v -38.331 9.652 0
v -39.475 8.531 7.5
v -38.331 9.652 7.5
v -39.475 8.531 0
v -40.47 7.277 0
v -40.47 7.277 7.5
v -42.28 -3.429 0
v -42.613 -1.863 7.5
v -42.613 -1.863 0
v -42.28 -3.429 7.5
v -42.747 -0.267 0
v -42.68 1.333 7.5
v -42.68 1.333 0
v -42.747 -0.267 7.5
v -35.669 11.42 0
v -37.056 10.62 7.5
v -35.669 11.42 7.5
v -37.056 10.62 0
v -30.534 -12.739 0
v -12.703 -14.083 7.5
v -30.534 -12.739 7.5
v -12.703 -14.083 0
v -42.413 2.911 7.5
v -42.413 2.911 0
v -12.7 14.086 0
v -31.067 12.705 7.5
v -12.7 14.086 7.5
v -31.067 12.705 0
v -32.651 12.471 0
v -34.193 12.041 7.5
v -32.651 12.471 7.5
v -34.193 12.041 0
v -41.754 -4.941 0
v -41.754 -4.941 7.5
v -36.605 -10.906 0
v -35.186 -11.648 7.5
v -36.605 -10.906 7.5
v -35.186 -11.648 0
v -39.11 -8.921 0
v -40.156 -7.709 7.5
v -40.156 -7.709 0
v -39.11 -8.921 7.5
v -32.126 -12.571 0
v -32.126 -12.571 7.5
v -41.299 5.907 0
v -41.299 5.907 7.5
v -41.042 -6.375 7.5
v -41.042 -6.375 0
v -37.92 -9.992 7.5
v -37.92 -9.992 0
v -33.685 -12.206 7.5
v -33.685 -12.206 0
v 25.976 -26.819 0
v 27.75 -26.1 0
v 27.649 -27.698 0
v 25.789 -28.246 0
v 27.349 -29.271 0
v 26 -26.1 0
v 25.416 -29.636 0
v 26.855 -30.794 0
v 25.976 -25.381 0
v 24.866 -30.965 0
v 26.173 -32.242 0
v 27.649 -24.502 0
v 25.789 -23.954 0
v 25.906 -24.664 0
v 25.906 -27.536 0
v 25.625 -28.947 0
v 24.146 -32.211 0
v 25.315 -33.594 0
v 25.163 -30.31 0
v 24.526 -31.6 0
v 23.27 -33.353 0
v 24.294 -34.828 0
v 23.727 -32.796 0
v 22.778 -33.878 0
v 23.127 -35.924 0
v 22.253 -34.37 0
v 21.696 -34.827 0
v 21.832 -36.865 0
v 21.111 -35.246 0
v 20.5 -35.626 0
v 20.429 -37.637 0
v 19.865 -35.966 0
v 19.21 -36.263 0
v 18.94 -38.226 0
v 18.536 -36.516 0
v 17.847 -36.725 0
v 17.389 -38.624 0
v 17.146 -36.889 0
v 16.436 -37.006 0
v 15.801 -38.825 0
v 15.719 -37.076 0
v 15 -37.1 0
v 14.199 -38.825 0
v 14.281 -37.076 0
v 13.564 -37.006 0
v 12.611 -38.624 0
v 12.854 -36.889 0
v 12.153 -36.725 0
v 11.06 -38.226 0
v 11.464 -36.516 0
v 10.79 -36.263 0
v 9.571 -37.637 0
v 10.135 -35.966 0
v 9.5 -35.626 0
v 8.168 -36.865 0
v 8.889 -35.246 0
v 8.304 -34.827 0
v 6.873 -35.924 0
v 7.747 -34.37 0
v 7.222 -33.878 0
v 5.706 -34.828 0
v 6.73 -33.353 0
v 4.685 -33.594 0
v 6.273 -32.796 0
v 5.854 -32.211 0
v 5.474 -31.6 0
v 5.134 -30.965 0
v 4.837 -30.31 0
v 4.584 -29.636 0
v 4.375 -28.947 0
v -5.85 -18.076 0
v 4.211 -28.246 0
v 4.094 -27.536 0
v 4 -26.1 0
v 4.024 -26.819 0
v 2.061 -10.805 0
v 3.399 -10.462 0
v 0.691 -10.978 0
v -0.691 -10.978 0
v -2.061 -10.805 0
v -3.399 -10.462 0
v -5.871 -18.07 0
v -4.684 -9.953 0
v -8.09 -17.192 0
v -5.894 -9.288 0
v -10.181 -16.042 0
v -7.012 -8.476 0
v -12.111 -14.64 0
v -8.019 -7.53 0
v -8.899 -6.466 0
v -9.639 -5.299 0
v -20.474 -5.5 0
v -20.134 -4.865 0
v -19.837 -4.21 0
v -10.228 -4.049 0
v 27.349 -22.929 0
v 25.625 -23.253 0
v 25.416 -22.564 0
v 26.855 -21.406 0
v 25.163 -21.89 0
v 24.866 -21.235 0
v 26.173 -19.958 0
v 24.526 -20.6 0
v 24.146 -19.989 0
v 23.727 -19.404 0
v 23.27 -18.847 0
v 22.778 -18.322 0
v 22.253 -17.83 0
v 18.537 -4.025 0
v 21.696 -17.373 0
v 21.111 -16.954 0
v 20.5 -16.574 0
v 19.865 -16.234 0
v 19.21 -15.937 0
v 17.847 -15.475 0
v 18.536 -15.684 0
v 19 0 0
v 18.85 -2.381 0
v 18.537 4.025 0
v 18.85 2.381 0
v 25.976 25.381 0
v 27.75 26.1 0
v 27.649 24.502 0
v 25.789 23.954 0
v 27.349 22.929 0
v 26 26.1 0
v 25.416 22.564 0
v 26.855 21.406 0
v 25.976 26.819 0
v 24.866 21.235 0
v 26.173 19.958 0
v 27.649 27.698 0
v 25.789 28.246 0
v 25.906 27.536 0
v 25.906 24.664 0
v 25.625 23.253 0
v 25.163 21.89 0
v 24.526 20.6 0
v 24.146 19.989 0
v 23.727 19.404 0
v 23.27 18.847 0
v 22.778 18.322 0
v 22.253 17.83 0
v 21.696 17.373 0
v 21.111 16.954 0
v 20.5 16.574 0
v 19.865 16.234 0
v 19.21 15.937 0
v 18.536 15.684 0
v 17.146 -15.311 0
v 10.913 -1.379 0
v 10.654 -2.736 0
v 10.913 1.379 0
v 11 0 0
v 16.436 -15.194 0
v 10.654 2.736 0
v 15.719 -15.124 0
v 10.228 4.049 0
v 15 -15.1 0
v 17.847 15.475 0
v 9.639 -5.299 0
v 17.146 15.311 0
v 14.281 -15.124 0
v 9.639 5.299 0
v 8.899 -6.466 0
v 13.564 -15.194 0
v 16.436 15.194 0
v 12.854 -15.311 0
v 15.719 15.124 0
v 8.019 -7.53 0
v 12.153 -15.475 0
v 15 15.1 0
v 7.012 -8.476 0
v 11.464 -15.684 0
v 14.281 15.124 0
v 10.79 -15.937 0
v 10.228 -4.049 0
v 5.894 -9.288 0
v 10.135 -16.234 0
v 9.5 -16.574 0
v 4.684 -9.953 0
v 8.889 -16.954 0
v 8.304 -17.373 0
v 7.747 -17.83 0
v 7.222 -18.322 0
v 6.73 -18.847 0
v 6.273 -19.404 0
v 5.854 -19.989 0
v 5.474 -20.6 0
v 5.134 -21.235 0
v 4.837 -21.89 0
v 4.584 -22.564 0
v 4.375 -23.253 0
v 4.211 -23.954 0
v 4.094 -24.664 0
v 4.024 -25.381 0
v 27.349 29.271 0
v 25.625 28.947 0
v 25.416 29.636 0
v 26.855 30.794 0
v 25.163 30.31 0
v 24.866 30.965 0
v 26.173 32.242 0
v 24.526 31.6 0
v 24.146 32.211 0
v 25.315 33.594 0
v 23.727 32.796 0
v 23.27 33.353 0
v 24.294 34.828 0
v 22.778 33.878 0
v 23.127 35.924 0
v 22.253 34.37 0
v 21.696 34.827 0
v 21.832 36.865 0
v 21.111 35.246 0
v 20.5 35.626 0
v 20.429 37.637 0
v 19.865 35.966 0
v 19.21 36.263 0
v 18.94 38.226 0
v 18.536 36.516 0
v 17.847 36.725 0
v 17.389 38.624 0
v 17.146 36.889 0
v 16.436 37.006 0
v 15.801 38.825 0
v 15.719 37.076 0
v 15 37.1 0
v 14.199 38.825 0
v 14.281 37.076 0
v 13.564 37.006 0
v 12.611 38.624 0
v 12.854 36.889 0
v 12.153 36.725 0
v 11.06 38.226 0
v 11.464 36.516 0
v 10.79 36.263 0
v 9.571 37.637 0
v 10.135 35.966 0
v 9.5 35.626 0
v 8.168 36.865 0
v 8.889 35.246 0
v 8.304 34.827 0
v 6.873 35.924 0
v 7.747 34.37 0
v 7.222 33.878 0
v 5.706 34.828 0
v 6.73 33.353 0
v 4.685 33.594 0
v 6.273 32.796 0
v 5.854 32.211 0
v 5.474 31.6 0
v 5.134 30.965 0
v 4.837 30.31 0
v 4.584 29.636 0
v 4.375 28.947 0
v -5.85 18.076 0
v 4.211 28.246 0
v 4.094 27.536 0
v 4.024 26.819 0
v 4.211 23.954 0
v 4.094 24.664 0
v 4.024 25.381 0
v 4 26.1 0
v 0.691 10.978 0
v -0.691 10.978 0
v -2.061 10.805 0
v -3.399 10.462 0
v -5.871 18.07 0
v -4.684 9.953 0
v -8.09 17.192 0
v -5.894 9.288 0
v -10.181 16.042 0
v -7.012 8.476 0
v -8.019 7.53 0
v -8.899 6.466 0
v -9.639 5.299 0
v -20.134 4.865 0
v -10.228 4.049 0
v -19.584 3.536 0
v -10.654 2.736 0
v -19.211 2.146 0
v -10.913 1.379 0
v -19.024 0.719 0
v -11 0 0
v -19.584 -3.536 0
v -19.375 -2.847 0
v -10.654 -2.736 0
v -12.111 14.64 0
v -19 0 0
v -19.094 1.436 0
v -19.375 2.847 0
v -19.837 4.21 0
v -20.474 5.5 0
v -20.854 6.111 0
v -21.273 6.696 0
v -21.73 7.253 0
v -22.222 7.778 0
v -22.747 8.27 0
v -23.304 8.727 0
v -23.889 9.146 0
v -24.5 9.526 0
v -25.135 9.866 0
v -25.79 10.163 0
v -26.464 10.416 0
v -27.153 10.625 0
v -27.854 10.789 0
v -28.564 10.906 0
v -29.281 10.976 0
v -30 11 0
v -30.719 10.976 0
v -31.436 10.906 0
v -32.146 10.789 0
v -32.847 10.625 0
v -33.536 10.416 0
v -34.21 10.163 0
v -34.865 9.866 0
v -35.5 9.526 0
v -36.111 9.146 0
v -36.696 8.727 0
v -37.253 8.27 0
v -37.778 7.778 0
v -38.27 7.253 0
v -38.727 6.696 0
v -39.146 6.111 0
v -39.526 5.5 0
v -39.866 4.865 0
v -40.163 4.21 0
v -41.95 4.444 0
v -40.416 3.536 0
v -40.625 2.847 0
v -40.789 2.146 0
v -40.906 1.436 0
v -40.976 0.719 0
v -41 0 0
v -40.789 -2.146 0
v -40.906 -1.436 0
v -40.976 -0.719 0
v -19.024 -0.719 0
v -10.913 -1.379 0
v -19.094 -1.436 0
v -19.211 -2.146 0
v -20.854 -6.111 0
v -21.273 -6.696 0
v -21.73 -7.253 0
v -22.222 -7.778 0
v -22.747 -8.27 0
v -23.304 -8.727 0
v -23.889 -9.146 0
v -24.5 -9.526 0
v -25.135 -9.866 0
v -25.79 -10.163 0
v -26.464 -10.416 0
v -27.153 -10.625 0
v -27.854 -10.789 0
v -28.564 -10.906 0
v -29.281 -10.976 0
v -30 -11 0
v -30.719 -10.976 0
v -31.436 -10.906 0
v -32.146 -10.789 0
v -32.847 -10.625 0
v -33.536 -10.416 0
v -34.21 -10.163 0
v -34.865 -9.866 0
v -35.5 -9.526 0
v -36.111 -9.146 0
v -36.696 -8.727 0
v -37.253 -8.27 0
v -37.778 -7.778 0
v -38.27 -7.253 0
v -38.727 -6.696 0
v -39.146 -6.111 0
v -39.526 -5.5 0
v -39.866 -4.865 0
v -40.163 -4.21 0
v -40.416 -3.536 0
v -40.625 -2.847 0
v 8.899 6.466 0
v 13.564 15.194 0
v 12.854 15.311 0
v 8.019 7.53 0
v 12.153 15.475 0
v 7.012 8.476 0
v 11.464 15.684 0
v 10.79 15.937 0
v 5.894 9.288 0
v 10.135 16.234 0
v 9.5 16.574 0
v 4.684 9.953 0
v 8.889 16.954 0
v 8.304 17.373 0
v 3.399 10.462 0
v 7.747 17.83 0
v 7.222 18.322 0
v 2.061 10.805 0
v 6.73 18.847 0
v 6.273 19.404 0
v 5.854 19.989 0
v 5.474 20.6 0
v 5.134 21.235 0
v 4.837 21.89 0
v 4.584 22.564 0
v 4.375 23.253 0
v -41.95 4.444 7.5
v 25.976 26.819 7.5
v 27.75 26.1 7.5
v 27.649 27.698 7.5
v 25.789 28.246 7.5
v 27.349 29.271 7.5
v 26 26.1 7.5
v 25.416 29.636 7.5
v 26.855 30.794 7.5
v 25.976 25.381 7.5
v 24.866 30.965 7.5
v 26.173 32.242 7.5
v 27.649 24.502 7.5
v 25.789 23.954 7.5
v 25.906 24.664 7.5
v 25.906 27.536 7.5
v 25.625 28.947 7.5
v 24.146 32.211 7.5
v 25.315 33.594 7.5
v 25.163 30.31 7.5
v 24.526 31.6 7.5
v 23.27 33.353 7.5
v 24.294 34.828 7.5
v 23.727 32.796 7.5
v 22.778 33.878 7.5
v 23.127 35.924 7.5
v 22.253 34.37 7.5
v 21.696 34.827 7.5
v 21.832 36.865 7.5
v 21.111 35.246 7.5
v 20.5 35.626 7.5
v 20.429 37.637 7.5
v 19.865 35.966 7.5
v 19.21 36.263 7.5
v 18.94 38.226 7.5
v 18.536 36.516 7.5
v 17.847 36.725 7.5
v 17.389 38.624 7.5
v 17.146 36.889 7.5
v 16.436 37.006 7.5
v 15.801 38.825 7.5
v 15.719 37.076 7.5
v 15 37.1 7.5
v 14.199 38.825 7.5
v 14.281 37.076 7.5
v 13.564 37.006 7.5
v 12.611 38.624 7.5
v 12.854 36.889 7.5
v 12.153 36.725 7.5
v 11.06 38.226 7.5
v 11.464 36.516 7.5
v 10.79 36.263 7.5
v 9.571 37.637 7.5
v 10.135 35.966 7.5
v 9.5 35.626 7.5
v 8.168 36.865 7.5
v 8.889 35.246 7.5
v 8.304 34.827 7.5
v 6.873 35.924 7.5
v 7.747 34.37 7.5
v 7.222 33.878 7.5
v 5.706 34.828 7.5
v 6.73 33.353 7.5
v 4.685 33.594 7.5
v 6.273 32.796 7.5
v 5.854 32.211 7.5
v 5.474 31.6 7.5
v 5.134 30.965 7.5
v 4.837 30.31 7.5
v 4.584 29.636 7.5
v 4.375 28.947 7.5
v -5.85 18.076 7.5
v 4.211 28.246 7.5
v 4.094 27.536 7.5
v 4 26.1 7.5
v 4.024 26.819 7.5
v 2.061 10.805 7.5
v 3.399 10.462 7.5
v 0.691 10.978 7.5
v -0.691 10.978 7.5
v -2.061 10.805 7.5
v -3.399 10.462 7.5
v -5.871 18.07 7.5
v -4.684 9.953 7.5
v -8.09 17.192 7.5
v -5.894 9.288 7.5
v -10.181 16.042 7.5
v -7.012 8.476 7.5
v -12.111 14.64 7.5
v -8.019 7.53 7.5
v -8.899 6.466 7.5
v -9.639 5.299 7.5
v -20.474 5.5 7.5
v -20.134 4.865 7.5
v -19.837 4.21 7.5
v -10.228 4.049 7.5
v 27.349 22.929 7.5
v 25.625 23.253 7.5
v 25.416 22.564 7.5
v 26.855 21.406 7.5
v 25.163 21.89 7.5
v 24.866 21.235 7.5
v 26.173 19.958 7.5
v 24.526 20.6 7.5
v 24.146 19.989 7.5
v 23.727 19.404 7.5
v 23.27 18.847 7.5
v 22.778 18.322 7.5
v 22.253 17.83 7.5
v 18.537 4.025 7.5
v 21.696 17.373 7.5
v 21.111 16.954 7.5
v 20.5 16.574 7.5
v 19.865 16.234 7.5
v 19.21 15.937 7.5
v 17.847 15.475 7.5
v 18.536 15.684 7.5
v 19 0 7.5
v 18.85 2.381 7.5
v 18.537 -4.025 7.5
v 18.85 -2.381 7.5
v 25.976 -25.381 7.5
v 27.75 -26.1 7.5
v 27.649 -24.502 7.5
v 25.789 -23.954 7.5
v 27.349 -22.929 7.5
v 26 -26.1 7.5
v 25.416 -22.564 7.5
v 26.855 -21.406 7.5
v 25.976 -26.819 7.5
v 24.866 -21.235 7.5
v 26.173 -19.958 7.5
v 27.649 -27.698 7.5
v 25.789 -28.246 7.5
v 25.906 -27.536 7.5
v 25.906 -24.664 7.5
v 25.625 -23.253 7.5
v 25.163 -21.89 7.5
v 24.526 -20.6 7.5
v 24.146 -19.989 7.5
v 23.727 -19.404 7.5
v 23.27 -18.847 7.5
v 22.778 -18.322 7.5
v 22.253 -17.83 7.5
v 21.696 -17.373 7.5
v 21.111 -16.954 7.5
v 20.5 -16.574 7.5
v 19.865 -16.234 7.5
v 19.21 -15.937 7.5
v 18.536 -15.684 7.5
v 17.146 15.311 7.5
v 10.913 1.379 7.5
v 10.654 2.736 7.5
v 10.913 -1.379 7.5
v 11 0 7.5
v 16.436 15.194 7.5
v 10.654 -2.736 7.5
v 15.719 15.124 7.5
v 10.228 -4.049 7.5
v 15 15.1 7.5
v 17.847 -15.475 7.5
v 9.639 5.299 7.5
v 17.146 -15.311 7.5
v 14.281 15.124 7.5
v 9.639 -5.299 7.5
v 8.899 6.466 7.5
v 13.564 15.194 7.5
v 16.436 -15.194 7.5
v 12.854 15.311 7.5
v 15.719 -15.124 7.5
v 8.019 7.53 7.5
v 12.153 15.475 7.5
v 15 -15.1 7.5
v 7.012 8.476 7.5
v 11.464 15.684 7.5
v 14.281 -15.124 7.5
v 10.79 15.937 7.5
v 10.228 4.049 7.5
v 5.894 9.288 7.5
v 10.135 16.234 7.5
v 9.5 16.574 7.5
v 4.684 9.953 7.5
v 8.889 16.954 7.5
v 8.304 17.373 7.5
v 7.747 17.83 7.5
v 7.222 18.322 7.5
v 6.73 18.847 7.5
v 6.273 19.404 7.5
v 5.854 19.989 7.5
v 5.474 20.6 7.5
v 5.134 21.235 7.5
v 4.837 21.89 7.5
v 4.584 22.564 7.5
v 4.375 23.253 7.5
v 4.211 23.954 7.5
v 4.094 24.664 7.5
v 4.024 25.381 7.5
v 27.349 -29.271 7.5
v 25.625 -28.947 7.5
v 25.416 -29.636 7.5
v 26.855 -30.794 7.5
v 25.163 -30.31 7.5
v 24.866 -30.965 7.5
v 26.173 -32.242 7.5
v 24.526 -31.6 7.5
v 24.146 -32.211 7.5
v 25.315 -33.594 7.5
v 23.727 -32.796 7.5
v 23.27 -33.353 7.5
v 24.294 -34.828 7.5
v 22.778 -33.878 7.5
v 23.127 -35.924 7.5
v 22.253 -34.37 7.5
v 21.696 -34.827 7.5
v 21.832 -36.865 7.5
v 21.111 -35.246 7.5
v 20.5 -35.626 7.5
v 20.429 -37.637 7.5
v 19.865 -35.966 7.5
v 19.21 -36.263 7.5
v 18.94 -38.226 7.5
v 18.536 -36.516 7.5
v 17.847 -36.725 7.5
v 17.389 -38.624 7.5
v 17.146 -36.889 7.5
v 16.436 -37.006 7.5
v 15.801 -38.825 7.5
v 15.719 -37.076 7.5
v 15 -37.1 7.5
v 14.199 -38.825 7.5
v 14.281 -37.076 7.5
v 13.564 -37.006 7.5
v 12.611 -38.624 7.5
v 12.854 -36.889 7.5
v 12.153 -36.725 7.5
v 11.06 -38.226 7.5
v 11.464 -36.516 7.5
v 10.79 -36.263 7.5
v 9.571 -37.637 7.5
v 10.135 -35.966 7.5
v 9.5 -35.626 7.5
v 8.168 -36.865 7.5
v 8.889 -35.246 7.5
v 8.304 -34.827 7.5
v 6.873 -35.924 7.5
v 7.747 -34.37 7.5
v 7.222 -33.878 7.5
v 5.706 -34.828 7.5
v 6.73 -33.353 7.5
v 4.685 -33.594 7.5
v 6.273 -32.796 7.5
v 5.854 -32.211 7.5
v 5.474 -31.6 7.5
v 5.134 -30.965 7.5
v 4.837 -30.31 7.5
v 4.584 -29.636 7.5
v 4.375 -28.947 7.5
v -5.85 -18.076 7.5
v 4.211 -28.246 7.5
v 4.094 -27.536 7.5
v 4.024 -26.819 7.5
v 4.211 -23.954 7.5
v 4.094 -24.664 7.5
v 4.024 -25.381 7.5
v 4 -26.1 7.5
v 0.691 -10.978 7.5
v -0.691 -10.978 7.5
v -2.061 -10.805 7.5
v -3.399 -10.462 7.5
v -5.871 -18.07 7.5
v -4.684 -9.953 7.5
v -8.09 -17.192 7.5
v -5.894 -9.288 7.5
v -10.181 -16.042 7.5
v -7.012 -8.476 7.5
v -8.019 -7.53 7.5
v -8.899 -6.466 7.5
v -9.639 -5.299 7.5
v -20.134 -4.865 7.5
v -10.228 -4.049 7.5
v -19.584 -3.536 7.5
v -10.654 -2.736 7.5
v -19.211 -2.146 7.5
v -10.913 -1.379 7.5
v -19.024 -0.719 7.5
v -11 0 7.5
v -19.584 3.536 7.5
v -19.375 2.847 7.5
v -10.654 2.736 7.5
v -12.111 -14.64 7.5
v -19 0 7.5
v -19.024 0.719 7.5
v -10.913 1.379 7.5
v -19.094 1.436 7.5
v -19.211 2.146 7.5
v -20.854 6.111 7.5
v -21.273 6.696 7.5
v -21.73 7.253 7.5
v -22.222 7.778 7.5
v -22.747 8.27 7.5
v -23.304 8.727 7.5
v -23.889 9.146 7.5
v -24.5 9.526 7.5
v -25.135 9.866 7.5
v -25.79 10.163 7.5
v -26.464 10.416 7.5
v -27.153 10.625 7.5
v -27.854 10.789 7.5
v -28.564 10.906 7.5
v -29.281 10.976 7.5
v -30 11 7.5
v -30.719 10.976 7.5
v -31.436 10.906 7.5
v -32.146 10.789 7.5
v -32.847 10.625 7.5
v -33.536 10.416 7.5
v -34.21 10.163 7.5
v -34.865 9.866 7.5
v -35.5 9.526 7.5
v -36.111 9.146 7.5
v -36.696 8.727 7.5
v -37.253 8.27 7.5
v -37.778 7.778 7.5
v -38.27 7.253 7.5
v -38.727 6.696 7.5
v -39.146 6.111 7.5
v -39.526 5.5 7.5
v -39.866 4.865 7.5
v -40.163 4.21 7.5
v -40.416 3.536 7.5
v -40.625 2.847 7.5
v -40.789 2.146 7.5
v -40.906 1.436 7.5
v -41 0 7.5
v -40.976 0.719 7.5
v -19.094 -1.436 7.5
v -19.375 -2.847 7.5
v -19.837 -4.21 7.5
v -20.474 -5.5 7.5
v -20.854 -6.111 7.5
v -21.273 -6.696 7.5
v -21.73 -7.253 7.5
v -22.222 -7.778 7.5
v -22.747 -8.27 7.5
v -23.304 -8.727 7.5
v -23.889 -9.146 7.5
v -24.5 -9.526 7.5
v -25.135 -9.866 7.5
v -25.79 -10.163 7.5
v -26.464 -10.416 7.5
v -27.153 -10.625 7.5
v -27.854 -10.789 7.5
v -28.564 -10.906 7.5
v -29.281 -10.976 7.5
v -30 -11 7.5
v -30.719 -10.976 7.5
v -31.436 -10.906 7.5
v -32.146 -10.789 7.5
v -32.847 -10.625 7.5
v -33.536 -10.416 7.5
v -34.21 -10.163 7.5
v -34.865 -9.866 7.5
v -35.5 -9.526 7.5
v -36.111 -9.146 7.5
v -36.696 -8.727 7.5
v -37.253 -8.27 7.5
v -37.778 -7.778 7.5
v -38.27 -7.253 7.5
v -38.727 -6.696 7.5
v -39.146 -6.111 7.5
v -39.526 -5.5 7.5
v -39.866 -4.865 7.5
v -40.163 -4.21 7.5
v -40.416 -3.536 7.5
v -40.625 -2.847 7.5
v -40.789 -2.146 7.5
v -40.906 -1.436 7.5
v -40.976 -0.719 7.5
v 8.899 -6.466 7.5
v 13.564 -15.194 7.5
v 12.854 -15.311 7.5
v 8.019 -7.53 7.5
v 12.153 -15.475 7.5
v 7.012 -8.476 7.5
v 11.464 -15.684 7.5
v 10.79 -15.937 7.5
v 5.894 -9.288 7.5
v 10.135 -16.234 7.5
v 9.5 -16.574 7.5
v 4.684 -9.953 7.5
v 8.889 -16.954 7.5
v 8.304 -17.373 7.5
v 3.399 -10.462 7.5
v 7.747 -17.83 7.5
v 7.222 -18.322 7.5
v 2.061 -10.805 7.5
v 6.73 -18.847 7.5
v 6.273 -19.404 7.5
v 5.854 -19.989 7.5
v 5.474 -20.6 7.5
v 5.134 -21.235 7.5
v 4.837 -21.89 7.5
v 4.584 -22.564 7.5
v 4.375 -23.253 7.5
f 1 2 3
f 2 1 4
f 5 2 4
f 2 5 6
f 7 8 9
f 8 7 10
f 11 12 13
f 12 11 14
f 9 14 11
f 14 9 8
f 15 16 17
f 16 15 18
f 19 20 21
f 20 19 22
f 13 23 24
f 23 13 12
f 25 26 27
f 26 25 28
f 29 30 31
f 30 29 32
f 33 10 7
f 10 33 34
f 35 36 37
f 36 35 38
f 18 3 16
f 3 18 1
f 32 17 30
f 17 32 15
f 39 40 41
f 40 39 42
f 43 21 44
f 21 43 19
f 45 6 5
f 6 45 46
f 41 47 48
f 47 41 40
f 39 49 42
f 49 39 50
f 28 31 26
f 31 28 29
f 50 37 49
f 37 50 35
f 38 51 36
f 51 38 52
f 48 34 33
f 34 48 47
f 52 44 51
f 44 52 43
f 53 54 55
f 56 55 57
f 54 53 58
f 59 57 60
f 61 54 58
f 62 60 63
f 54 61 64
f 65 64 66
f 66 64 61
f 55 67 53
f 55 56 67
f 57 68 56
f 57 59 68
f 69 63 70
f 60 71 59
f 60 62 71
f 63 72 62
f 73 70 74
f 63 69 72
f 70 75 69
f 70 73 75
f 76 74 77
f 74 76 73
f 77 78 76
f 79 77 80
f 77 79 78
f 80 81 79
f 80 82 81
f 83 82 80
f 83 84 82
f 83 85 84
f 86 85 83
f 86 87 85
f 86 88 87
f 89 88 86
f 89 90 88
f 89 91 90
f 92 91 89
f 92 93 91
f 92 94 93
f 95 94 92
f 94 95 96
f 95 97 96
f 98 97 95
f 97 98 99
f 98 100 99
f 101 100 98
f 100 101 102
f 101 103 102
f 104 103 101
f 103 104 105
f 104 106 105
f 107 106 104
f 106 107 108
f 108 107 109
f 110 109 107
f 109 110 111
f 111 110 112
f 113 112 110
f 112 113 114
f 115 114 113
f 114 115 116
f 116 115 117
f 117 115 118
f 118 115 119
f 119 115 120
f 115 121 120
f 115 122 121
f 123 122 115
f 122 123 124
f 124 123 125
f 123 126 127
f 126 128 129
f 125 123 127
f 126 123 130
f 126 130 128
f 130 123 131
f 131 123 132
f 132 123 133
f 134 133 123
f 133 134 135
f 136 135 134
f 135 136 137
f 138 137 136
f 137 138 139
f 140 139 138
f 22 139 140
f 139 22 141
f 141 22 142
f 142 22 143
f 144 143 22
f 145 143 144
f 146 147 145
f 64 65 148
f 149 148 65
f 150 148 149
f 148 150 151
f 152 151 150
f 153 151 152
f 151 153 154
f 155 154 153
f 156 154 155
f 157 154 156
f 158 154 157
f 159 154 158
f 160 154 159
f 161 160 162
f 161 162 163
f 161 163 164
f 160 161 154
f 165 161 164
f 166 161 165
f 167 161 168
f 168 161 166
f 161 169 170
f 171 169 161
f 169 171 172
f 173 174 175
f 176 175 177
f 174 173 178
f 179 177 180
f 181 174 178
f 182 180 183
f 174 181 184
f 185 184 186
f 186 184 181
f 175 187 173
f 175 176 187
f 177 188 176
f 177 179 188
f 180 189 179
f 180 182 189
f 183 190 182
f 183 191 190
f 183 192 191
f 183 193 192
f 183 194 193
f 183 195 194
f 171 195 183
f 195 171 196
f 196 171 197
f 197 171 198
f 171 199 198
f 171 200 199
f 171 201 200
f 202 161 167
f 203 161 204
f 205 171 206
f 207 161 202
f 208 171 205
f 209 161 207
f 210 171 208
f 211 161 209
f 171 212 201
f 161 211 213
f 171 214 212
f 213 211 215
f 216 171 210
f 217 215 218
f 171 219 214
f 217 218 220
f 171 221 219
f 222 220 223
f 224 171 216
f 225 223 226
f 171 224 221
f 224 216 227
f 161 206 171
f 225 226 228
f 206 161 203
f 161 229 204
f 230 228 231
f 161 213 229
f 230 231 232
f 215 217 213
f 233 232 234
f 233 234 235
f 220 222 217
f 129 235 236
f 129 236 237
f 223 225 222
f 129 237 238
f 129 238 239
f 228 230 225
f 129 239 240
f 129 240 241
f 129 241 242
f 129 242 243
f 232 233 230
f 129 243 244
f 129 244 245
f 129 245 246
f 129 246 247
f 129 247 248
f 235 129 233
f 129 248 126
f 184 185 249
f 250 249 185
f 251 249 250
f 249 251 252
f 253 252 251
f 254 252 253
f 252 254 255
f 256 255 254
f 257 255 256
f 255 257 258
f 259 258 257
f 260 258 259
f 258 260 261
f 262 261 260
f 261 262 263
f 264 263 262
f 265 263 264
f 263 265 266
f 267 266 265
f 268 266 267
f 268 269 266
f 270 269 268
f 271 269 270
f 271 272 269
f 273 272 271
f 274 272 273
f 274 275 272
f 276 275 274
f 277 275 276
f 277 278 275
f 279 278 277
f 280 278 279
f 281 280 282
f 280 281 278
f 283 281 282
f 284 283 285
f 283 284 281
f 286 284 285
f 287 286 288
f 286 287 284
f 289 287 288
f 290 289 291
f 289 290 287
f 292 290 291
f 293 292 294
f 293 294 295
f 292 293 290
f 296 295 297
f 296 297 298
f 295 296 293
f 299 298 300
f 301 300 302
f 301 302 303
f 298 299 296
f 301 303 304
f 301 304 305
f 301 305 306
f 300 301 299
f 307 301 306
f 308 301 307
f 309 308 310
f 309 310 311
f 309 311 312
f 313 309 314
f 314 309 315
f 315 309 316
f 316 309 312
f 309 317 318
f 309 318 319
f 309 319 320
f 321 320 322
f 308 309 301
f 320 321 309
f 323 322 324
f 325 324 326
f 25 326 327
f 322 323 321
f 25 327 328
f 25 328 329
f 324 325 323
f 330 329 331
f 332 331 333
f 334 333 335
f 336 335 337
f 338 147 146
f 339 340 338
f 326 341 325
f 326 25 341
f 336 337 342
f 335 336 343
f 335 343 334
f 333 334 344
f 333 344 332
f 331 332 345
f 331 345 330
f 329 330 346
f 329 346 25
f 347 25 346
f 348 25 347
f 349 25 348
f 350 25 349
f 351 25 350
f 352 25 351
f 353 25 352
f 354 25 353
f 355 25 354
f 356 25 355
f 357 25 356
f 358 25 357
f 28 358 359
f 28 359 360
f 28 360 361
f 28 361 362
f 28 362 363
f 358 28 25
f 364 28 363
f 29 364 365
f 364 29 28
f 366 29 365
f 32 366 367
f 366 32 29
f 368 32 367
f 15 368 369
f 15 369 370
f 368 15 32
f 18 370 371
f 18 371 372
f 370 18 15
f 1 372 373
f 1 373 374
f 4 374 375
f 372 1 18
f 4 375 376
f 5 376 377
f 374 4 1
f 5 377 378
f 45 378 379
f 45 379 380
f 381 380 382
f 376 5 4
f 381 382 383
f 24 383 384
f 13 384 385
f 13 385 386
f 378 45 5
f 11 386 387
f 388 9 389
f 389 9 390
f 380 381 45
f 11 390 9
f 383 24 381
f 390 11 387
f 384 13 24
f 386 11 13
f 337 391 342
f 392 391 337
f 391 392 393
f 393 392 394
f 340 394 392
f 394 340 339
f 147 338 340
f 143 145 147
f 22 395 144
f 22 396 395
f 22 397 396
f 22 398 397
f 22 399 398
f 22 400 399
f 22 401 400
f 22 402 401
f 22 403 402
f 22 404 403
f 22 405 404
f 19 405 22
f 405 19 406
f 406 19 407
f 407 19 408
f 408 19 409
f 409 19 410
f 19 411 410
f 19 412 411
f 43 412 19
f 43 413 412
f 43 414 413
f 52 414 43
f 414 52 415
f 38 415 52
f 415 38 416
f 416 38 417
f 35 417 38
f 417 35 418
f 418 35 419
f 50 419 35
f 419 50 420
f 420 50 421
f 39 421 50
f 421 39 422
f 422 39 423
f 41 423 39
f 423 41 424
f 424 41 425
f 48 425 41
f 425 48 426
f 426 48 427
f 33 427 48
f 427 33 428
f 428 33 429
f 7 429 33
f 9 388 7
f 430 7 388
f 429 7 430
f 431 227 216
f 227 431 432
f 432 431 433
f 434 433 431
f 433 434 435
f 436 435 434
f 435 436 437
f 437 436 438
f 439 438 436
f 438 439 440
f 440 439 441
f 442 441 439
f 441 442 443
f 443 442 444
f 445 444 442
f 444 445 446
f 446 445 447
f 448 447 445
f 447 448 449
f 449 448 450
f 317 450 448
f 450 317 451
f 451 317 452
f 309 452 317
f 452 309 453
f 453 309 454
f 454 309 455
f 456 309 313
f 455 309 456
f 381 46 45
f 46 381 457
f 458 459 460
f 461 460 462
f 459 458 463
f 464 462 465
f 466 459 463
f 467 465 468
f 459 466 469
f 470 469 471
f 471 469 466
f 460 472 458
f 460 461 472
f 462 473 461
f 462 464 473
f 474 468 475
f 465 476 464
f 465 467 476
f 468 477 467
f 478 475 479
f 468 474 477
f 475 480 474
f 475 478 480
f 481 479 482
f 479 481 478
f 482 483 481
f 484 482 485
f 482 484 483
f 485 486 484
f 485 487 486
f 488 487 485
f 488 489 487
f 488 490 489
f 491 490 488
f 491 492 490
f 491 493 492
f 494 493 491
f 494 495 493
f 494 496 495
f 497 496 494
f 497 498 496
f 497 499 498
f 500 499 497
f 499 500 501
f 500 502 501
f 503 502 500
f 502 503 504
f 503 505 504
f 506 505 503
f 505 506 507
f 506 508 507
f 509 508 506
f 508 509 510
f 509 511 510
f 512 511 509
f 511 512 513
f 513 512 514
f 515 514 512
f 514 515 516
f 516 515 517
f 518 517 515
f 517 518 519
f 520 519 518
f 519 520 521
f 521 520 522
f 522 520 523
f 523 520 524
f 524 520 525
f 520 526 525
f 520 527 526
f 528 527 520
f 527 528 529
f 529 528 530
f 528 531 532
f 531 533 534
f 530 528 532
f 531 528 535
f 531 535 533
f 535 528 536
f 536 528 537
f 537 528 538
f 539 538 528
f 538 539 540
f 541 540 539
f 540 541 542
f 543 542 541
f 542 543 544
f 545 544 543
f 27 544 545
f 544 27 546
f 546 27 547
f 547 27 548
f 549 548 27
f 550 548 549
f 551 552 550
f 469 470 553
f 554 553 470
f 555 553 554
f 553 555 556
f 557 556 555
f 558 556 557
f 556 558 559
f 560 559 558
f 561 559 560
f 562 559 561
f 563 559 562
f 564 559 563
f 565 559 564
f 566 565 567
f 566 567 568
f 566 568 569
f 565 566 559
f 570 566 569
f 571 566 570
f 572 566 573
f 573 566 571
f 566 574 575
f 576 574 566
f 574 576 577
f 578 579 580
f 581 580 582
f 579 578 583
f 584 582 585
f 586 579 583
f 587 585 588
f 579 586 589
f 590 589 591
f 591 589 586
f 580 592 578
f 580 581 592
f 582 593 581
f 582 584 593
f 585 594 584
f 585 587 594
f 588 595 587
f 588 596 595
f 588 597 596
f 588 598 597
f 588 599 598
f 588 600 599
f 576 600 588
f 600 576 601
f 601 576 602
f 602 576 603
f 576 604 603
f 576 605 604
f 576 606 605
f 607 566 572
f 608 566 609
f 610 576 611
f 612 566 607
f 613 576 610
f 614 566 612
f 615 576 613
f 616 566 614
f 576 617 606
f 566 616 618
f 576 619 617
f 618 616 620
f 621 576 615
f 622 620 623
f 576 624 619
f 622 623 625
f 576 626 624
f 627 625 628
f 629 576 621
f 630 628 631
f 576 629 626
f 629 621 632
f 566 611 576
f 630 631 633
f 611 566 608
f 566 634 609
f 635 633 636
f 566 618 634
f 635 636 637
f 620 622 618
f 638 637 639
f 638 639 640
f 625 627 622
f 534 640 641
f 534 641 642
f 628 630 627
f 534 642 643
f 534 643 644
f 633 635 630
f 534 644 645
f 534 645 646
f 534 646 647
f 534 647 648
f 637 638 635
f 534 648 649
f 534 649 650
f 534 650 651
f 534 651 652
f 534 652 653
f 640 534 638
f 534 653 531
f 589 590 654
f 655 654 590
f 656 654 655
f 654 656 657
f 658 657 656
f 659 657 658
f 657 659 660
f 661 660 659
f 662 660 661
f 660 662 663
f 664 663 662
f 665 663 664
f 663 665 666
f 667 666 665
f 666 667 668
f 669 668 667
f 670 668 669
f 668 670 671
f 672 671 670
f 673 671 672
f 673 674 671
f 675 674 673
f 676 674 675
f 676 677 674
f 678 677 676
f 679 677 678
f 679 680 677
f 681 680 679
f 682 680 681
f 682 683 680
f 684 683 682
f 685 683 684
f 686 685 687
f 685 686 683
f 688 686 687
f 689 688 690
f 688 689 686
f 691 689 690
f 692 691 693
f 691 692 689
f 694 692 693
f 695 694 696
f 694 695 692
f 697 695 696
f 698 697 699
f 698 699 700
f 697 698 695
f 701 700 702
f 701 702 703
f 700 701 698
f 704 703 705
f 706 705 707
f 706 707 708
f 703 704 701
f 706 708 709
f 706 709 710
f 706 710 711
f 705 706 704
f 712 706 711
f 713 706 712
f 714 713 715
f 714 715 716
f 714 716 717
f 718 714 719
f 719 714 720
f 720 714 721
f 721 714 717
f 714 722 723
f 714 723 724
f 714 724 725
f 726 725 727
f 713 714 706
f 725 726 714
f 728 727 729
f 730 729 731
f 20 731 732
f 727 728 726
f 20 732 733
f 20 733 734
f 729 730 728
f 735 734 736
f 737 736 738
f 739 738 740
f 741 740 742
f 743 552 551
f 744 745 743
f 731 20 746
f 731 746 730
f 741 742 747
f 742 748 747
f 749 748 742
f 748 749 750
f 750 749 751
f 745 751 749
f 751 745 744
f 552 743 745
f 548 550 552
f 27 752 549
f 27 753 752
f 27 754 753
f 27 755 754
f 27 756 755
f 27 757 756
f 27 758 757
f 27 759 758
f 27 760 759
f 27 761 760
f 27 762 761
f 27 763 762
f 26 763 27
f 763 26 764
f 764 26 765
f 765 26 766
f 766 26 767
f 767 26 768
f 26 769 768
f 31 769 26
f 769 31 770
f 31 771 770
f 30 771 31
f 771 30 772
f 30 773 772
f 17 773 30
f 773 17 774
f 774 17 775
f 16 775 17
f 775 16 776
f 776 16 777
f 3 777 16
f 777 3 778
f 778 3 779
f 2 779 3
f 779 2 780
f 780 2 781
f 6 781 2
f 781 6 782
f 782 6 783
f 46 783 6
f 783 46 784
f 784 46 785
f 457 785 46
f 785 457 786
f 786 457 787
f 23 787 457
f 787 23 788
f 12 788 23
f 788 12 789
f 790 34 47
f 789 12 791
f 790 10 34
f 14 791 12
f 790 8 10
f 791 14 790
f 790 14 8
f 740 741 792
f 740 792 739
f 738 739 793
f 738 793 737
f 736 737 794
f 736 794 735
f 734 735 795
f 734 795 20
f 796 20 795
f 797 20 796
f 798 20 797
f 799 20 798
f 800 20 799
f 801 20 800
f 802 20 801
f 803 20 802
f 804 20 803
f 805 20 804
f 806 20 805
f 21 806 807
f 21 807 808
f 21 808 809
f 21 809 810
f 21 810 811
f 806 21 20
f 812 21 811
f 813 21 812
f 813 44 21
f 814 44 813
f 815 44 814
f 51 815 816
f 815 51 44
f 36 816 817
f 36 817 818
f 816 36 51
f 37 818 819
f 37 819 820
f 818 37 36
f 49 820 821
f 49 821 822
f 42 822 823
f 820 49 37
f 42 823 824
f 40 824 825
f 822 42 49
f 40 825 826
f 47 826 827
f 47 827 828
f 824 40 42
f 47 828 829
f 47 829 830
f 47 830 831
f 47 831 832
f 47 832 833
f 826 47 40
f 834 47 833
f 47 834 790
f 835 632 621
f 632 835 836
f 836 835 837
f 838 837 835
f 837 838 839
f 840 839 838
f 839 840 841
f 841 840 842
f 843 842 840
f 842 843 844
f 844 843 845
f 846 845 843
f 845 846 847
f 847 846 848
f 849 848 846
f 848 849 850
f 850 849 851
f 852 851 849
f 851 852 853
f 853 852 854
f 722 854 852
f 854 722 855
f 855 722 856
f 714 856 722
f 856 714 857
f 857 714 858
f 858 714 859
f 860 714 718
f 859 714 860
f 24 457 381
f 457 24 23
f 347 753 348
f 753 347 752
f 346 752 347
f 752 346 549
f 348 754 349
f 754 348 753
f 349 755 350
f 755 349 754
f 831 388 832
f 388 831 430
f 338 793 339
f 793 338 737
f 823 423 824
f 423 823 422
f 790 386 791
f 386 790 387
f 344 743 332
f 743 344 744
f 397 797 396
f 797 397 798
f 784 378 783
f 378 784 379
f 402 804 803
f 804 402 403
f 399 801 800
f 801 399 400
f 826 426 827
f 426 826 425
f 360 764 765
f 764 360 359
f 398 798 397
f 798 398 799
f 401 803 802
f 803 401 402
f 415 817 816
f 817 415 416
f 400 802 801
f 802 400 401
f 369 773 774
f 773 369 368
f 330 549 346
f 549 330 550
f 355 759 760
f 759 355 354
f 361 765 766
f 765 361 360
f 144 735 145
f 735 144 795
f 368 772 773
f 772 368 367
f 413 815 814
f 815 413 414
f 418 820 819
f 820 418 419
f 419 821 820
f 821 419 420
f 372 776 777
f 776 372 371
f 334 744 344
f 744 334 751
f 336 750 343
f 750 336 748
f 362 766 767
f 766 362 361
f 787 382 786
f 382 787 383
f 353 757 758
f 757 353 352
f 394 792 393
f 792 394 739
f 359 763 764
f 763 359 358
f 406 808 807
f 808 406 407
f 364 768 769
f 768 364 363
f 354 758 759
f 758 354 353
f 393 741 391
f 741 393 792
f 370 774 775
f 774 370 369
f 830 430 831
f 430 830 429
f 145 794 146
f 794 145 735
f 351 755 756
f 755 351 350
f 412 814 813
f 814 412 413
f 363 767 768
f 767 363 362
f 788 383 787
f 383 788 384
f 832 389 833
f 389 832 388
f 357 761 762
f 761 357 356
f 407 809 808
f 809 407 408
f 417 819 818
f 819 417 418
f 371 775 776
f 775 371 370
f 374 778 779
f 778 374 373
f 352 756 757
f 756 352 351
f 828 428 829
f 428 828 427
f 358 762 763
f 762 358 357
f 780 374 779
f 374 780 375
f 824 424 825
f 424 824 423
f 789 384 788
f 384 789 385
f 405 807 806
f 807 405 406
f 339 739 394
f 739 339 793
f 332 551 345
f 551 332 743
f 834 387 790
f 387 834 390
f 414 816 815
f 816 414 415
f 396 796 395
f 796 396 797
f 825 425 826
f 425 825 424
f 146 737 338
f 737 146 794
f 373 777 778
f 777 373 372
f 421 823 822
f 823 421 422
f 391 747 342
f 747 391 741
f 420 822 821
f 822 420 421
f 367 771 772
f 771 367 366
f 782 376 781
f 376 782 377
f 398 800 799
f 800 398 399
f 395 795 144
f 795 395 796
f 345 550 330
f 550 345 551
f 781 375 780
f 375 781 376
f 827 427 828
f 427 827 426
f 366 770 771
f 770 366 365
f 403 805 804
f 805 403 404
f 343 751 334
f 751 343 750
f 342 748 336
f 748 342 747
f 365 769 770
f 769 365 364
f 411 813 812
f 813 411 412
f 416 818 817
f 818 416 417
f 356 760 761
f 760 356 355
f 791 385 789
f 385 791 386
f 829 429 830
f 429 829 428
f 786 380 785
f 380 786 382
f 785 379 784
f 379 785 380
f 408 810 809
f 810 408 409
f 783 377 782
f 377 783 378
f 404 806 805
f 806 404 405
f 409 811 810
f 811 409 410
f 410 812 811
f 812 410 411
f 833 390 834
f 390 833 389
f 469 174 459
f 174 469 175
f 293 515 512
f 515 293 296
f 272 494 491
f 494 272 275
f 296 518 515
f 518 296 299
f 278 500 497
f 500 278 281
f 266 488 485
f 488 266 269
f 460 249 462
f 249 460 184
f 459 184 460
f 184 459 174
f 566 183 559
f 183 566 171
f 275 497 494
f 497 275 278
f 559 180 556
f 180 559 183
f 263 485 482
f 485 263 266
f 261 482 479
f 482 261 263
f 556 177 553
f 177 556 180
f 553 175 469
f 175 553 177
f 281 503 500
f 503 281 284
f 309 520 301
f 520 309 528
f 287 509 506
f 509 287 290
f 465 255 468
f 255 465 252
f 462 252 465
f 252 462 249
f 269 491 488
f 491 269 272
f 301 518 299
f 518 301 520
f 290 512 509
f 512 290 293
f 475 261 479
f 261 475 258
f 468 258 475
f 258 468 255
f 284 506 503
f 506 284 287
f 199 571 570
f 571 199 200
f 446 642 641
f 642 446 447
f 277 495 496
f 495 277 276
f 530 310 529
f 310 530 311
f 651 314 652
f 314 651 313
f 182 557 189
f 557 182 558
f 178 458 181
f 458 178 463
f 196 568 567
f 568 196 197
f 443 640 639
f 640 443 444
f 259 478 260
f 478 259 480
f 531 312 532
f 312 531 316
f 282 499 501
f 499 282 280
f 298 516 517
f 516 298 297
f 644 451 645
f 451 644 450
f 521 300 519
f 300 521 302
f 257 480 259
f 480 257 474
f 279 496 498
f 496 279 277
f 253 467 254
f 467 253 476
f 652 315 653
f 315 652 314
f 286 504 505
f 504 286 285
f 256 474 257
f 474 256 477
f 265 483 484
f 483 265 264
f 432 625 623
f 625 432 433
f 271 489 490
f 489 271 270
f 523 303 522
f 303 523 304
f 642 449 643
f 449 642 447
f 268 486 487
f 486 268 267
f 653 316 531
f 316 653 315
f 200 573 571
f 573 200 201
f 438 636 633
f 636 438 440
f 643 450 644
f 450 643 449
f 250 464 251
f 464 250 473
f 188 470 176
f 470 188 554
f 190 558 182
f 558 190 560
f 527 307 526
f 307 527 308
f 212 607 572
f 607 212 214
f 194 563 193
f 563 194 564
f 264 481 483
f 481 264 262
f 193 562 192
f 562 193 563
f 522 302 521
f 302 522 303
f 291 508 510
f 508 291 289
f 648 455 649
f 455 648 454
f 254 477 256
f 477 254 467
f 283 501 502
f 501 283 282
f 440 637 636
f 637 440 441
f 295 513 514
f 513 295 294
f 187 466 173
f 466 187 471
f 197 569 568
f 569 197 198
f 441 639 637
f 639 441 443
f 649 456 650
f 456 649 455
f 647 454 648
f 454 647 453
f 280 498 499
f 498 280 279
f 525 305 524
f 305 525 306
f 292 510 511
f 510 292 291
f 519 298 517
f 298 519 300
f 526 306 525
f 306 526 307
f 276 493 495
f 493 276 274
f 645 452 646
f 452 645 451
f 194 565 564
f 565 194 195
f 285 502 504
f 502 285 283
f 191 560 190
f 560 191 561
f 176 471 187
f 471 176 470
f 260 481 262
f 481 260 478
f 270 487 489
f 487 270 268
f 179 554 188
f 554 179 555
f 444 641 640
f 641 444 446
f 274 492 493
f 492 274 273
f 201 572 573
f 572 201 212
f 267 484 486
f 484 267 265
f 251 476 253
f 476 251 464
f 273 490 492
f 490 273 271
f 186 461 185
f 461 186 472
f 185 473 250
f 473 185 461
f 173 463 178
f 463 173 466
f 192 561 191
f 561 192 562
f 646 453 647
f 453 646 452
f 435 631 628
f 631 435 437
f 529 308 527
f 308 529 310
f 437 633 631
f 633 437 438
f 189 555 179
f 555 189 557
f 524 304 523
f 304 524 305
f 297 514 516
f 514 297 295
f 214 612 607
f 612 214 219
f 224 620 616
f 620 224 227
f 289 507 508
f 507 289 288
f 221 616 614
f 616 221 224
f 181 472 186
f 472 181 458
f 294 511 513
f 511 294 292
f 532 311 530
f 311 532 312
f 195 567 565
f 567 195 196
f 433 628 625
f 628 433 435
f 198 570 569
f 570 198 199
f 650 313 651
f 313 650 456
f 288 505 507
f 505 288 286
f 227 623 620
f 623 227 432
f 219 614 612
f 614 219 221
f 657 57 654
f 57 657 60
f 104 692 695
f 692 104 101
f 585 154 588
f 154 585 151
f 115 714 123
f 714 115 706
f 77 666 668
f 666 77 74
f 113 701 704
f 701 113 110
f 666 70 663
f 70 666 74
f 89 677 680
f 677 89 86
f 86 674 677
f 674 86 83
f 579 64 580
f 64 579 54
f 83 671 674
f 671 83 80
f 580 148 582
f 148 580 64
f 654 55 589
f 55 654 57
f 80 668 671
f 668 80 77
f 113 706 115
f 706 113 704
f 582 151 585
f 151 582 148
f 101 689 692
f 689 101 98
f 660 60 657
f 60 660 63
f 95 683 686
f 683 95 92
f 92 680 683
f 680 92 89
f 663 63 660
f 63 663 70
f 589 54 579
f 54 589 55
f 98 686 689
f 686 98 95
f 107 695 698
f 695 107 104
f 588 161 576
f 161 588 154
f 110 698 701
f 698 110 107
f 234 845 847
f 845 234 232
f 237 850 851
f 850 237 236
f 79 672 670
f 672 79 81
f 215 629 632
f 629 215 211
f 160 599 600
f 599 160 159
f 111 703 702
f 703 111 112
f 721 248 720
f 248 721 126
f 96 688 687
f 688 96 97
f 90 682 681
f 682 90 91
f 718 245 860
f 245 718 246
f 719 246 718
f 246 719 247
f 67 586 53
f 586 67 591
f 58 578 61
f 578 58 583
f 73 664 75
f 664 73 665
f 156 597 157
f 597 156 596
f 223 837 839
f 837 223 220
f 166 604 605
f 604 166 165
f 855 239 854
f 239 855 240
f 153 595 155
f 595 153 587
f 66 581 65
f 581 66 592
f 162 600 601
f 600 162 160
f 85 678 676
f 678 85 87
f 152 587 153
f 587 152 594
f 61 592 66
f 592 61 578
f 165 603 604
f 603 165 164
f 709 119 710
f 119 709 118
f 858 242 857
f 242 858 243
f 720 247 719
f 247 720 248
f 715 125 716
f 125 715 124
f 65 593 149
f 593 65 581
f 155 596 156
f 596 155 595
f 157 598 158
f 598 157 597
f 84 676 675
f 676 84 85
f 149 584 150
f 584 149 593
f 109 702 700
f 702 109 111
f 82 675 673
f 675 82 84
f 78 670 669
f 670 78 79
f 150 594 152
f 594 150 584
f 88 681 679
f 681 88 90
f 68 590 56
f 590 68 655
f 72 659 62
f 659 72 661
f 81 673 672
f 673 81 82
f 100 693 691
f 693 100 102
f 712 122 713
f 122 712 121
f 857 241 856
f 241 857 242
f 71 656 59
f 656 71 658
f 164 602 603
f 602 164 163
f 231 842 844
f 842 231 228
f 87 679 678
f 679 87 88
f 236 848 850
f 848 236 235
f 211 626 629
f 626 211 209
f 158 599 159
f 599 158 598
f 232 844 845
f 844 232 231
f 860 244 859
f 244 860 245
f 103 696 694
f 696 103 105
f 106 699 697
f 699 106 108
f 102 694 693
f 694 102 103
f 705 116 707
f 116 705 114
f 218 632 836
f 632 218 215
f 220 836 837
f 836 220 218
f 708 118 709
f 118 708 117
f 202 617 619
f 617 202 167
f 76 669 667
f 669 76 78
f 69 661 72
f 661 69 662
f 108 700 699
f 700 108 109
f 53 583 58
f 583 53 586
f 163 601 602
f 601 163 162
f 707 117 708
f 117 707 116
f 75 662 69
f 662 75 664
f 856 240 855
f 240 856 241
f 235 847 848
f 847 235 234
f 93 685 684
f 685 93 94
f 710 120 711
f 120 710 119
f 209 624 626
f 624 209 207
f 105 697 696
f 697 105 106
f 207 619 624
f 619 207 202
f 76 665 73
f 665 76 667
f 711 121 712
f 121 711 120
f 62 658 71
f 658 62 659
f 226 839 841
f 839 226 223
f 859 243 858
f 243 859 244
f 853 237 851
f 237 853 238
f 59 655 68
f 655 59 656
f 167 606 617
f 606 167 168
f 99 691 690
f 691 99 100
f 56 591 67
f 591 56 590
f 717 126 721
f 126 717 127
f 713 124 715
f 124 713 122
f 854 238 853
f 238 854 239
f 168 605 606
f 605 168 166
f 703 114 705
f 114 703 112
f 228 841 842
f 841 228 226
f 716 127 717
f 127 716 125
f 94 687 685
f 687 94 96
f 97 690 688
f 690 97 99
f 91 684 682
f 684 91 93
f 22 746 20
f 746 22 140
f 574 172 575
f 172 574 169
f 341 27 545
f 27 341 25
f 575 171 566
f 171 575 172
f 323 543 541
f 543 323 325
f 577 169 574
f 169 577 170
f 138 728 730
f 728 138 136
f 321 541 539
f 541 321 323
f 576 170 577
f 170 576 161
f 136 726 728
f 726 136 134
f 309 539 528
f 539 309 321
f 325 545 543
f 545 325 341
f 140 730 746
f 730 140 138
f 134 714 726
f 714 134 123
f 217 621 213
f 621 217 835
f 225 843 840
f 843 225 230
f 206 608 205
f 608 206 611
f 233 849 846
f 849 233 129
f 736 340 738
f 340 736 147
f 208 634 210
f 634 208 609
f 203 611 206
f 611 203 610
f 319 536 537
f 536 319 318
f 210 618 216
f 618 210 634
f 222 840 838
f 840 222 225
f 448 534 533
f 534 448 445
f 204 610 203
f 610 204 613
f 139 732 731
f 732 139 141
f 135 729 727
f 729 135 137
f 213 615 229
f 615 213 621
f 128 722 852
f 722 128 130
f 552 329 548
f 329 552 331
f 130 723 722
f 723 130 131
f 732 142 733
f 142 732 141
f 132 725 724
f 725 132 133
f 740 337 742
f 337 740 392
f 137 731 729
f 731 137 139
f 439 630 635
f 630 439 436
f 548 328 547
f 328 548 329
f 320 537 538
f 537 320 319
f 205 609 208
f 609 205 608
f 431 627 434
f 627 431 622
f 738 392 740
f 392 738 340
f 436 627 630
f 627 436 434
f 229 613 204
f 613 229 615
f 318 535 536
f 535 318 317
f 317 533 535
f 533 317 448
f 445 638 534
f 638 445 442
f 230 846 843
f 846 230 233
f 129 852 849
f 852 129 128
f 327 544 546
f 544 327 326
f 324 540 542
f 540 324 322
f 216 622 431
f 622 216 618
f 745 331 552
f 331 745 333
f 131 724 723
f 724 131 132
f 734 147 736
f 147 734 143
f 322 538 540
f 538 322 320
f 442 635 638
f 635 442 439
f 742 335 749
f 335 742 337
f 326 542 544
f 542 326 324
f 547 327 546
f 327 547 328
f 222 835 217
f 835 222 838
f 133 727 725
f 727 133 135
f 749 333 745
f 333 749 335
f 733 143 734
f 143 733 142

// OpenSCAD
// dc-fidget-spinner
// Configurable DIY fidget spinner design
// Copyright 2014-2017 Nicholas Brookins and Danger Creations, LLC
// http://dangercreations.com/
// https://github.com/nbrookins/danger-gadgets.git
// http://www.thingiverse.com/knick

$fn=50;
// thickness of spnner body.  most bearings are 7-8mm
body_thickness = 7.5;
//diameter of center hole.  typical bearings are 22mm
body_hole_diameter = 22;
//dimater of body surrounding center hole, should be larger than hole diameter
body_diameter = 38;

// number of arms, supports 2, 3, or 4.
arms = 3; //[2-4]
//length of each arm
arm_length = 30;
//diameter of the hole in each arm.  22 for a bearing, or less for other weights, etc.  if using a hex nut, measure widest part from point to point
arm_hole_diameter = 22;
//sides for arm holes, set to 6 in order to weight them with hex nuts
arm_hole_sides = 0;
//thickness of material around each arm hole
arm_thickness = 3.5;
// size of center part to hull each arm against, adjust how thick each arm is.
arm_hull_center = 30;

ahs = (arm_hole_sides==0) ? 96 : arm_hole_sides;
arm_diam = arm_hole_diameter + arm_thickness;

difference(){
    union(){
        if(arms==4){
            difference(){
                hull(){
                    translate([0,arm_length,0])
                    cylinder(d=arm_diam, h=body_thickness);
                    cylinder(d=arm_hull_center, h=body_thickness);
                }
                translate([0,arm_length,-.01])
                cylinder(d=arm_hole_diameter, h=body_thickness*2, $fn=ahs);
            }
            difference(){
                hull(){
                    translate([0,-arm_length,0])
                    cylinder(d=arm_diam, h=body_thickness);
                    cylinder(d=arm_hull_center, h=body_thickness);
                }
                translate([0,-arm_length,-.01])
                cylinder(d=arm_hole_diameter, h=body_thickness*2, $fn=ahs);
            }
        }

        if(arms==4 || arms==2){
            difference(){
                hull(){
                    translate([arm_length,0,0])
                    rotate([0,0,30])
                    cylinder(d=arm_diam, h=body_thickness);
                    cylinder(d=arm_hull_center, h=body_thickness);
                }
                translate([arm_length,0,-.01])
                rotate([0,0,30])
                cylinder(d=arm_hole_diameter, h=body_thickness*2, $fn=ahs);
            }
        }
        difference(){
            hull(){
                translate([-arm_length,0,0])
                rotate([0,0,30])
                cylinder(d=arm_diam, h=body_thickness);
                cylinder(d=arm_hull_center, h=body_thickness);
            }
            translate([-arm_length,0,-.01])
            rotate([0,0,30])
            cylinder(d=arm_hole_diameter, h=body_thickness*2, $fn=ahs);
         }
         
         if(arms==3){
             difference(){
                hull(){
                    translate([arm_length*.5,arm_length*.87,0])
                    cylinder(d=arm_diam, h=body_thickness);
                    cylinder(d=arm_hull_center, h=body_thickness);
                }
                translate([arm_length*.5,arm_length*.87,-0.01])
                rotate([0,0,30])
                cylinder(d=arm_hole_diameter, h=body_thickness*2, $fn=ahs);
            }
            difference(){
                 hull(){
                    translate([arm_length*.5,-arm_length*.87,0])
                    cylinder(d=arm_diam, h=body_thickness);
                    cylinder(d=arm_hull_center, h=body_thickness);
                }   
                translate([arm_length*.5,-arm_length*.87,-0.01])
                rotate([0,0,30])
                cylinder(d=arm_hole_diameter, h=body_thickness*2, $fn=ahs);
            }
        }  
        
        //main body
        cylinder(d=body_diameter, h=body_thickness);
    }    

    //center hole
    translate([0,0,-1])
    cylinder(d=body_hole_diameter, h=body_thickness*2);
}
